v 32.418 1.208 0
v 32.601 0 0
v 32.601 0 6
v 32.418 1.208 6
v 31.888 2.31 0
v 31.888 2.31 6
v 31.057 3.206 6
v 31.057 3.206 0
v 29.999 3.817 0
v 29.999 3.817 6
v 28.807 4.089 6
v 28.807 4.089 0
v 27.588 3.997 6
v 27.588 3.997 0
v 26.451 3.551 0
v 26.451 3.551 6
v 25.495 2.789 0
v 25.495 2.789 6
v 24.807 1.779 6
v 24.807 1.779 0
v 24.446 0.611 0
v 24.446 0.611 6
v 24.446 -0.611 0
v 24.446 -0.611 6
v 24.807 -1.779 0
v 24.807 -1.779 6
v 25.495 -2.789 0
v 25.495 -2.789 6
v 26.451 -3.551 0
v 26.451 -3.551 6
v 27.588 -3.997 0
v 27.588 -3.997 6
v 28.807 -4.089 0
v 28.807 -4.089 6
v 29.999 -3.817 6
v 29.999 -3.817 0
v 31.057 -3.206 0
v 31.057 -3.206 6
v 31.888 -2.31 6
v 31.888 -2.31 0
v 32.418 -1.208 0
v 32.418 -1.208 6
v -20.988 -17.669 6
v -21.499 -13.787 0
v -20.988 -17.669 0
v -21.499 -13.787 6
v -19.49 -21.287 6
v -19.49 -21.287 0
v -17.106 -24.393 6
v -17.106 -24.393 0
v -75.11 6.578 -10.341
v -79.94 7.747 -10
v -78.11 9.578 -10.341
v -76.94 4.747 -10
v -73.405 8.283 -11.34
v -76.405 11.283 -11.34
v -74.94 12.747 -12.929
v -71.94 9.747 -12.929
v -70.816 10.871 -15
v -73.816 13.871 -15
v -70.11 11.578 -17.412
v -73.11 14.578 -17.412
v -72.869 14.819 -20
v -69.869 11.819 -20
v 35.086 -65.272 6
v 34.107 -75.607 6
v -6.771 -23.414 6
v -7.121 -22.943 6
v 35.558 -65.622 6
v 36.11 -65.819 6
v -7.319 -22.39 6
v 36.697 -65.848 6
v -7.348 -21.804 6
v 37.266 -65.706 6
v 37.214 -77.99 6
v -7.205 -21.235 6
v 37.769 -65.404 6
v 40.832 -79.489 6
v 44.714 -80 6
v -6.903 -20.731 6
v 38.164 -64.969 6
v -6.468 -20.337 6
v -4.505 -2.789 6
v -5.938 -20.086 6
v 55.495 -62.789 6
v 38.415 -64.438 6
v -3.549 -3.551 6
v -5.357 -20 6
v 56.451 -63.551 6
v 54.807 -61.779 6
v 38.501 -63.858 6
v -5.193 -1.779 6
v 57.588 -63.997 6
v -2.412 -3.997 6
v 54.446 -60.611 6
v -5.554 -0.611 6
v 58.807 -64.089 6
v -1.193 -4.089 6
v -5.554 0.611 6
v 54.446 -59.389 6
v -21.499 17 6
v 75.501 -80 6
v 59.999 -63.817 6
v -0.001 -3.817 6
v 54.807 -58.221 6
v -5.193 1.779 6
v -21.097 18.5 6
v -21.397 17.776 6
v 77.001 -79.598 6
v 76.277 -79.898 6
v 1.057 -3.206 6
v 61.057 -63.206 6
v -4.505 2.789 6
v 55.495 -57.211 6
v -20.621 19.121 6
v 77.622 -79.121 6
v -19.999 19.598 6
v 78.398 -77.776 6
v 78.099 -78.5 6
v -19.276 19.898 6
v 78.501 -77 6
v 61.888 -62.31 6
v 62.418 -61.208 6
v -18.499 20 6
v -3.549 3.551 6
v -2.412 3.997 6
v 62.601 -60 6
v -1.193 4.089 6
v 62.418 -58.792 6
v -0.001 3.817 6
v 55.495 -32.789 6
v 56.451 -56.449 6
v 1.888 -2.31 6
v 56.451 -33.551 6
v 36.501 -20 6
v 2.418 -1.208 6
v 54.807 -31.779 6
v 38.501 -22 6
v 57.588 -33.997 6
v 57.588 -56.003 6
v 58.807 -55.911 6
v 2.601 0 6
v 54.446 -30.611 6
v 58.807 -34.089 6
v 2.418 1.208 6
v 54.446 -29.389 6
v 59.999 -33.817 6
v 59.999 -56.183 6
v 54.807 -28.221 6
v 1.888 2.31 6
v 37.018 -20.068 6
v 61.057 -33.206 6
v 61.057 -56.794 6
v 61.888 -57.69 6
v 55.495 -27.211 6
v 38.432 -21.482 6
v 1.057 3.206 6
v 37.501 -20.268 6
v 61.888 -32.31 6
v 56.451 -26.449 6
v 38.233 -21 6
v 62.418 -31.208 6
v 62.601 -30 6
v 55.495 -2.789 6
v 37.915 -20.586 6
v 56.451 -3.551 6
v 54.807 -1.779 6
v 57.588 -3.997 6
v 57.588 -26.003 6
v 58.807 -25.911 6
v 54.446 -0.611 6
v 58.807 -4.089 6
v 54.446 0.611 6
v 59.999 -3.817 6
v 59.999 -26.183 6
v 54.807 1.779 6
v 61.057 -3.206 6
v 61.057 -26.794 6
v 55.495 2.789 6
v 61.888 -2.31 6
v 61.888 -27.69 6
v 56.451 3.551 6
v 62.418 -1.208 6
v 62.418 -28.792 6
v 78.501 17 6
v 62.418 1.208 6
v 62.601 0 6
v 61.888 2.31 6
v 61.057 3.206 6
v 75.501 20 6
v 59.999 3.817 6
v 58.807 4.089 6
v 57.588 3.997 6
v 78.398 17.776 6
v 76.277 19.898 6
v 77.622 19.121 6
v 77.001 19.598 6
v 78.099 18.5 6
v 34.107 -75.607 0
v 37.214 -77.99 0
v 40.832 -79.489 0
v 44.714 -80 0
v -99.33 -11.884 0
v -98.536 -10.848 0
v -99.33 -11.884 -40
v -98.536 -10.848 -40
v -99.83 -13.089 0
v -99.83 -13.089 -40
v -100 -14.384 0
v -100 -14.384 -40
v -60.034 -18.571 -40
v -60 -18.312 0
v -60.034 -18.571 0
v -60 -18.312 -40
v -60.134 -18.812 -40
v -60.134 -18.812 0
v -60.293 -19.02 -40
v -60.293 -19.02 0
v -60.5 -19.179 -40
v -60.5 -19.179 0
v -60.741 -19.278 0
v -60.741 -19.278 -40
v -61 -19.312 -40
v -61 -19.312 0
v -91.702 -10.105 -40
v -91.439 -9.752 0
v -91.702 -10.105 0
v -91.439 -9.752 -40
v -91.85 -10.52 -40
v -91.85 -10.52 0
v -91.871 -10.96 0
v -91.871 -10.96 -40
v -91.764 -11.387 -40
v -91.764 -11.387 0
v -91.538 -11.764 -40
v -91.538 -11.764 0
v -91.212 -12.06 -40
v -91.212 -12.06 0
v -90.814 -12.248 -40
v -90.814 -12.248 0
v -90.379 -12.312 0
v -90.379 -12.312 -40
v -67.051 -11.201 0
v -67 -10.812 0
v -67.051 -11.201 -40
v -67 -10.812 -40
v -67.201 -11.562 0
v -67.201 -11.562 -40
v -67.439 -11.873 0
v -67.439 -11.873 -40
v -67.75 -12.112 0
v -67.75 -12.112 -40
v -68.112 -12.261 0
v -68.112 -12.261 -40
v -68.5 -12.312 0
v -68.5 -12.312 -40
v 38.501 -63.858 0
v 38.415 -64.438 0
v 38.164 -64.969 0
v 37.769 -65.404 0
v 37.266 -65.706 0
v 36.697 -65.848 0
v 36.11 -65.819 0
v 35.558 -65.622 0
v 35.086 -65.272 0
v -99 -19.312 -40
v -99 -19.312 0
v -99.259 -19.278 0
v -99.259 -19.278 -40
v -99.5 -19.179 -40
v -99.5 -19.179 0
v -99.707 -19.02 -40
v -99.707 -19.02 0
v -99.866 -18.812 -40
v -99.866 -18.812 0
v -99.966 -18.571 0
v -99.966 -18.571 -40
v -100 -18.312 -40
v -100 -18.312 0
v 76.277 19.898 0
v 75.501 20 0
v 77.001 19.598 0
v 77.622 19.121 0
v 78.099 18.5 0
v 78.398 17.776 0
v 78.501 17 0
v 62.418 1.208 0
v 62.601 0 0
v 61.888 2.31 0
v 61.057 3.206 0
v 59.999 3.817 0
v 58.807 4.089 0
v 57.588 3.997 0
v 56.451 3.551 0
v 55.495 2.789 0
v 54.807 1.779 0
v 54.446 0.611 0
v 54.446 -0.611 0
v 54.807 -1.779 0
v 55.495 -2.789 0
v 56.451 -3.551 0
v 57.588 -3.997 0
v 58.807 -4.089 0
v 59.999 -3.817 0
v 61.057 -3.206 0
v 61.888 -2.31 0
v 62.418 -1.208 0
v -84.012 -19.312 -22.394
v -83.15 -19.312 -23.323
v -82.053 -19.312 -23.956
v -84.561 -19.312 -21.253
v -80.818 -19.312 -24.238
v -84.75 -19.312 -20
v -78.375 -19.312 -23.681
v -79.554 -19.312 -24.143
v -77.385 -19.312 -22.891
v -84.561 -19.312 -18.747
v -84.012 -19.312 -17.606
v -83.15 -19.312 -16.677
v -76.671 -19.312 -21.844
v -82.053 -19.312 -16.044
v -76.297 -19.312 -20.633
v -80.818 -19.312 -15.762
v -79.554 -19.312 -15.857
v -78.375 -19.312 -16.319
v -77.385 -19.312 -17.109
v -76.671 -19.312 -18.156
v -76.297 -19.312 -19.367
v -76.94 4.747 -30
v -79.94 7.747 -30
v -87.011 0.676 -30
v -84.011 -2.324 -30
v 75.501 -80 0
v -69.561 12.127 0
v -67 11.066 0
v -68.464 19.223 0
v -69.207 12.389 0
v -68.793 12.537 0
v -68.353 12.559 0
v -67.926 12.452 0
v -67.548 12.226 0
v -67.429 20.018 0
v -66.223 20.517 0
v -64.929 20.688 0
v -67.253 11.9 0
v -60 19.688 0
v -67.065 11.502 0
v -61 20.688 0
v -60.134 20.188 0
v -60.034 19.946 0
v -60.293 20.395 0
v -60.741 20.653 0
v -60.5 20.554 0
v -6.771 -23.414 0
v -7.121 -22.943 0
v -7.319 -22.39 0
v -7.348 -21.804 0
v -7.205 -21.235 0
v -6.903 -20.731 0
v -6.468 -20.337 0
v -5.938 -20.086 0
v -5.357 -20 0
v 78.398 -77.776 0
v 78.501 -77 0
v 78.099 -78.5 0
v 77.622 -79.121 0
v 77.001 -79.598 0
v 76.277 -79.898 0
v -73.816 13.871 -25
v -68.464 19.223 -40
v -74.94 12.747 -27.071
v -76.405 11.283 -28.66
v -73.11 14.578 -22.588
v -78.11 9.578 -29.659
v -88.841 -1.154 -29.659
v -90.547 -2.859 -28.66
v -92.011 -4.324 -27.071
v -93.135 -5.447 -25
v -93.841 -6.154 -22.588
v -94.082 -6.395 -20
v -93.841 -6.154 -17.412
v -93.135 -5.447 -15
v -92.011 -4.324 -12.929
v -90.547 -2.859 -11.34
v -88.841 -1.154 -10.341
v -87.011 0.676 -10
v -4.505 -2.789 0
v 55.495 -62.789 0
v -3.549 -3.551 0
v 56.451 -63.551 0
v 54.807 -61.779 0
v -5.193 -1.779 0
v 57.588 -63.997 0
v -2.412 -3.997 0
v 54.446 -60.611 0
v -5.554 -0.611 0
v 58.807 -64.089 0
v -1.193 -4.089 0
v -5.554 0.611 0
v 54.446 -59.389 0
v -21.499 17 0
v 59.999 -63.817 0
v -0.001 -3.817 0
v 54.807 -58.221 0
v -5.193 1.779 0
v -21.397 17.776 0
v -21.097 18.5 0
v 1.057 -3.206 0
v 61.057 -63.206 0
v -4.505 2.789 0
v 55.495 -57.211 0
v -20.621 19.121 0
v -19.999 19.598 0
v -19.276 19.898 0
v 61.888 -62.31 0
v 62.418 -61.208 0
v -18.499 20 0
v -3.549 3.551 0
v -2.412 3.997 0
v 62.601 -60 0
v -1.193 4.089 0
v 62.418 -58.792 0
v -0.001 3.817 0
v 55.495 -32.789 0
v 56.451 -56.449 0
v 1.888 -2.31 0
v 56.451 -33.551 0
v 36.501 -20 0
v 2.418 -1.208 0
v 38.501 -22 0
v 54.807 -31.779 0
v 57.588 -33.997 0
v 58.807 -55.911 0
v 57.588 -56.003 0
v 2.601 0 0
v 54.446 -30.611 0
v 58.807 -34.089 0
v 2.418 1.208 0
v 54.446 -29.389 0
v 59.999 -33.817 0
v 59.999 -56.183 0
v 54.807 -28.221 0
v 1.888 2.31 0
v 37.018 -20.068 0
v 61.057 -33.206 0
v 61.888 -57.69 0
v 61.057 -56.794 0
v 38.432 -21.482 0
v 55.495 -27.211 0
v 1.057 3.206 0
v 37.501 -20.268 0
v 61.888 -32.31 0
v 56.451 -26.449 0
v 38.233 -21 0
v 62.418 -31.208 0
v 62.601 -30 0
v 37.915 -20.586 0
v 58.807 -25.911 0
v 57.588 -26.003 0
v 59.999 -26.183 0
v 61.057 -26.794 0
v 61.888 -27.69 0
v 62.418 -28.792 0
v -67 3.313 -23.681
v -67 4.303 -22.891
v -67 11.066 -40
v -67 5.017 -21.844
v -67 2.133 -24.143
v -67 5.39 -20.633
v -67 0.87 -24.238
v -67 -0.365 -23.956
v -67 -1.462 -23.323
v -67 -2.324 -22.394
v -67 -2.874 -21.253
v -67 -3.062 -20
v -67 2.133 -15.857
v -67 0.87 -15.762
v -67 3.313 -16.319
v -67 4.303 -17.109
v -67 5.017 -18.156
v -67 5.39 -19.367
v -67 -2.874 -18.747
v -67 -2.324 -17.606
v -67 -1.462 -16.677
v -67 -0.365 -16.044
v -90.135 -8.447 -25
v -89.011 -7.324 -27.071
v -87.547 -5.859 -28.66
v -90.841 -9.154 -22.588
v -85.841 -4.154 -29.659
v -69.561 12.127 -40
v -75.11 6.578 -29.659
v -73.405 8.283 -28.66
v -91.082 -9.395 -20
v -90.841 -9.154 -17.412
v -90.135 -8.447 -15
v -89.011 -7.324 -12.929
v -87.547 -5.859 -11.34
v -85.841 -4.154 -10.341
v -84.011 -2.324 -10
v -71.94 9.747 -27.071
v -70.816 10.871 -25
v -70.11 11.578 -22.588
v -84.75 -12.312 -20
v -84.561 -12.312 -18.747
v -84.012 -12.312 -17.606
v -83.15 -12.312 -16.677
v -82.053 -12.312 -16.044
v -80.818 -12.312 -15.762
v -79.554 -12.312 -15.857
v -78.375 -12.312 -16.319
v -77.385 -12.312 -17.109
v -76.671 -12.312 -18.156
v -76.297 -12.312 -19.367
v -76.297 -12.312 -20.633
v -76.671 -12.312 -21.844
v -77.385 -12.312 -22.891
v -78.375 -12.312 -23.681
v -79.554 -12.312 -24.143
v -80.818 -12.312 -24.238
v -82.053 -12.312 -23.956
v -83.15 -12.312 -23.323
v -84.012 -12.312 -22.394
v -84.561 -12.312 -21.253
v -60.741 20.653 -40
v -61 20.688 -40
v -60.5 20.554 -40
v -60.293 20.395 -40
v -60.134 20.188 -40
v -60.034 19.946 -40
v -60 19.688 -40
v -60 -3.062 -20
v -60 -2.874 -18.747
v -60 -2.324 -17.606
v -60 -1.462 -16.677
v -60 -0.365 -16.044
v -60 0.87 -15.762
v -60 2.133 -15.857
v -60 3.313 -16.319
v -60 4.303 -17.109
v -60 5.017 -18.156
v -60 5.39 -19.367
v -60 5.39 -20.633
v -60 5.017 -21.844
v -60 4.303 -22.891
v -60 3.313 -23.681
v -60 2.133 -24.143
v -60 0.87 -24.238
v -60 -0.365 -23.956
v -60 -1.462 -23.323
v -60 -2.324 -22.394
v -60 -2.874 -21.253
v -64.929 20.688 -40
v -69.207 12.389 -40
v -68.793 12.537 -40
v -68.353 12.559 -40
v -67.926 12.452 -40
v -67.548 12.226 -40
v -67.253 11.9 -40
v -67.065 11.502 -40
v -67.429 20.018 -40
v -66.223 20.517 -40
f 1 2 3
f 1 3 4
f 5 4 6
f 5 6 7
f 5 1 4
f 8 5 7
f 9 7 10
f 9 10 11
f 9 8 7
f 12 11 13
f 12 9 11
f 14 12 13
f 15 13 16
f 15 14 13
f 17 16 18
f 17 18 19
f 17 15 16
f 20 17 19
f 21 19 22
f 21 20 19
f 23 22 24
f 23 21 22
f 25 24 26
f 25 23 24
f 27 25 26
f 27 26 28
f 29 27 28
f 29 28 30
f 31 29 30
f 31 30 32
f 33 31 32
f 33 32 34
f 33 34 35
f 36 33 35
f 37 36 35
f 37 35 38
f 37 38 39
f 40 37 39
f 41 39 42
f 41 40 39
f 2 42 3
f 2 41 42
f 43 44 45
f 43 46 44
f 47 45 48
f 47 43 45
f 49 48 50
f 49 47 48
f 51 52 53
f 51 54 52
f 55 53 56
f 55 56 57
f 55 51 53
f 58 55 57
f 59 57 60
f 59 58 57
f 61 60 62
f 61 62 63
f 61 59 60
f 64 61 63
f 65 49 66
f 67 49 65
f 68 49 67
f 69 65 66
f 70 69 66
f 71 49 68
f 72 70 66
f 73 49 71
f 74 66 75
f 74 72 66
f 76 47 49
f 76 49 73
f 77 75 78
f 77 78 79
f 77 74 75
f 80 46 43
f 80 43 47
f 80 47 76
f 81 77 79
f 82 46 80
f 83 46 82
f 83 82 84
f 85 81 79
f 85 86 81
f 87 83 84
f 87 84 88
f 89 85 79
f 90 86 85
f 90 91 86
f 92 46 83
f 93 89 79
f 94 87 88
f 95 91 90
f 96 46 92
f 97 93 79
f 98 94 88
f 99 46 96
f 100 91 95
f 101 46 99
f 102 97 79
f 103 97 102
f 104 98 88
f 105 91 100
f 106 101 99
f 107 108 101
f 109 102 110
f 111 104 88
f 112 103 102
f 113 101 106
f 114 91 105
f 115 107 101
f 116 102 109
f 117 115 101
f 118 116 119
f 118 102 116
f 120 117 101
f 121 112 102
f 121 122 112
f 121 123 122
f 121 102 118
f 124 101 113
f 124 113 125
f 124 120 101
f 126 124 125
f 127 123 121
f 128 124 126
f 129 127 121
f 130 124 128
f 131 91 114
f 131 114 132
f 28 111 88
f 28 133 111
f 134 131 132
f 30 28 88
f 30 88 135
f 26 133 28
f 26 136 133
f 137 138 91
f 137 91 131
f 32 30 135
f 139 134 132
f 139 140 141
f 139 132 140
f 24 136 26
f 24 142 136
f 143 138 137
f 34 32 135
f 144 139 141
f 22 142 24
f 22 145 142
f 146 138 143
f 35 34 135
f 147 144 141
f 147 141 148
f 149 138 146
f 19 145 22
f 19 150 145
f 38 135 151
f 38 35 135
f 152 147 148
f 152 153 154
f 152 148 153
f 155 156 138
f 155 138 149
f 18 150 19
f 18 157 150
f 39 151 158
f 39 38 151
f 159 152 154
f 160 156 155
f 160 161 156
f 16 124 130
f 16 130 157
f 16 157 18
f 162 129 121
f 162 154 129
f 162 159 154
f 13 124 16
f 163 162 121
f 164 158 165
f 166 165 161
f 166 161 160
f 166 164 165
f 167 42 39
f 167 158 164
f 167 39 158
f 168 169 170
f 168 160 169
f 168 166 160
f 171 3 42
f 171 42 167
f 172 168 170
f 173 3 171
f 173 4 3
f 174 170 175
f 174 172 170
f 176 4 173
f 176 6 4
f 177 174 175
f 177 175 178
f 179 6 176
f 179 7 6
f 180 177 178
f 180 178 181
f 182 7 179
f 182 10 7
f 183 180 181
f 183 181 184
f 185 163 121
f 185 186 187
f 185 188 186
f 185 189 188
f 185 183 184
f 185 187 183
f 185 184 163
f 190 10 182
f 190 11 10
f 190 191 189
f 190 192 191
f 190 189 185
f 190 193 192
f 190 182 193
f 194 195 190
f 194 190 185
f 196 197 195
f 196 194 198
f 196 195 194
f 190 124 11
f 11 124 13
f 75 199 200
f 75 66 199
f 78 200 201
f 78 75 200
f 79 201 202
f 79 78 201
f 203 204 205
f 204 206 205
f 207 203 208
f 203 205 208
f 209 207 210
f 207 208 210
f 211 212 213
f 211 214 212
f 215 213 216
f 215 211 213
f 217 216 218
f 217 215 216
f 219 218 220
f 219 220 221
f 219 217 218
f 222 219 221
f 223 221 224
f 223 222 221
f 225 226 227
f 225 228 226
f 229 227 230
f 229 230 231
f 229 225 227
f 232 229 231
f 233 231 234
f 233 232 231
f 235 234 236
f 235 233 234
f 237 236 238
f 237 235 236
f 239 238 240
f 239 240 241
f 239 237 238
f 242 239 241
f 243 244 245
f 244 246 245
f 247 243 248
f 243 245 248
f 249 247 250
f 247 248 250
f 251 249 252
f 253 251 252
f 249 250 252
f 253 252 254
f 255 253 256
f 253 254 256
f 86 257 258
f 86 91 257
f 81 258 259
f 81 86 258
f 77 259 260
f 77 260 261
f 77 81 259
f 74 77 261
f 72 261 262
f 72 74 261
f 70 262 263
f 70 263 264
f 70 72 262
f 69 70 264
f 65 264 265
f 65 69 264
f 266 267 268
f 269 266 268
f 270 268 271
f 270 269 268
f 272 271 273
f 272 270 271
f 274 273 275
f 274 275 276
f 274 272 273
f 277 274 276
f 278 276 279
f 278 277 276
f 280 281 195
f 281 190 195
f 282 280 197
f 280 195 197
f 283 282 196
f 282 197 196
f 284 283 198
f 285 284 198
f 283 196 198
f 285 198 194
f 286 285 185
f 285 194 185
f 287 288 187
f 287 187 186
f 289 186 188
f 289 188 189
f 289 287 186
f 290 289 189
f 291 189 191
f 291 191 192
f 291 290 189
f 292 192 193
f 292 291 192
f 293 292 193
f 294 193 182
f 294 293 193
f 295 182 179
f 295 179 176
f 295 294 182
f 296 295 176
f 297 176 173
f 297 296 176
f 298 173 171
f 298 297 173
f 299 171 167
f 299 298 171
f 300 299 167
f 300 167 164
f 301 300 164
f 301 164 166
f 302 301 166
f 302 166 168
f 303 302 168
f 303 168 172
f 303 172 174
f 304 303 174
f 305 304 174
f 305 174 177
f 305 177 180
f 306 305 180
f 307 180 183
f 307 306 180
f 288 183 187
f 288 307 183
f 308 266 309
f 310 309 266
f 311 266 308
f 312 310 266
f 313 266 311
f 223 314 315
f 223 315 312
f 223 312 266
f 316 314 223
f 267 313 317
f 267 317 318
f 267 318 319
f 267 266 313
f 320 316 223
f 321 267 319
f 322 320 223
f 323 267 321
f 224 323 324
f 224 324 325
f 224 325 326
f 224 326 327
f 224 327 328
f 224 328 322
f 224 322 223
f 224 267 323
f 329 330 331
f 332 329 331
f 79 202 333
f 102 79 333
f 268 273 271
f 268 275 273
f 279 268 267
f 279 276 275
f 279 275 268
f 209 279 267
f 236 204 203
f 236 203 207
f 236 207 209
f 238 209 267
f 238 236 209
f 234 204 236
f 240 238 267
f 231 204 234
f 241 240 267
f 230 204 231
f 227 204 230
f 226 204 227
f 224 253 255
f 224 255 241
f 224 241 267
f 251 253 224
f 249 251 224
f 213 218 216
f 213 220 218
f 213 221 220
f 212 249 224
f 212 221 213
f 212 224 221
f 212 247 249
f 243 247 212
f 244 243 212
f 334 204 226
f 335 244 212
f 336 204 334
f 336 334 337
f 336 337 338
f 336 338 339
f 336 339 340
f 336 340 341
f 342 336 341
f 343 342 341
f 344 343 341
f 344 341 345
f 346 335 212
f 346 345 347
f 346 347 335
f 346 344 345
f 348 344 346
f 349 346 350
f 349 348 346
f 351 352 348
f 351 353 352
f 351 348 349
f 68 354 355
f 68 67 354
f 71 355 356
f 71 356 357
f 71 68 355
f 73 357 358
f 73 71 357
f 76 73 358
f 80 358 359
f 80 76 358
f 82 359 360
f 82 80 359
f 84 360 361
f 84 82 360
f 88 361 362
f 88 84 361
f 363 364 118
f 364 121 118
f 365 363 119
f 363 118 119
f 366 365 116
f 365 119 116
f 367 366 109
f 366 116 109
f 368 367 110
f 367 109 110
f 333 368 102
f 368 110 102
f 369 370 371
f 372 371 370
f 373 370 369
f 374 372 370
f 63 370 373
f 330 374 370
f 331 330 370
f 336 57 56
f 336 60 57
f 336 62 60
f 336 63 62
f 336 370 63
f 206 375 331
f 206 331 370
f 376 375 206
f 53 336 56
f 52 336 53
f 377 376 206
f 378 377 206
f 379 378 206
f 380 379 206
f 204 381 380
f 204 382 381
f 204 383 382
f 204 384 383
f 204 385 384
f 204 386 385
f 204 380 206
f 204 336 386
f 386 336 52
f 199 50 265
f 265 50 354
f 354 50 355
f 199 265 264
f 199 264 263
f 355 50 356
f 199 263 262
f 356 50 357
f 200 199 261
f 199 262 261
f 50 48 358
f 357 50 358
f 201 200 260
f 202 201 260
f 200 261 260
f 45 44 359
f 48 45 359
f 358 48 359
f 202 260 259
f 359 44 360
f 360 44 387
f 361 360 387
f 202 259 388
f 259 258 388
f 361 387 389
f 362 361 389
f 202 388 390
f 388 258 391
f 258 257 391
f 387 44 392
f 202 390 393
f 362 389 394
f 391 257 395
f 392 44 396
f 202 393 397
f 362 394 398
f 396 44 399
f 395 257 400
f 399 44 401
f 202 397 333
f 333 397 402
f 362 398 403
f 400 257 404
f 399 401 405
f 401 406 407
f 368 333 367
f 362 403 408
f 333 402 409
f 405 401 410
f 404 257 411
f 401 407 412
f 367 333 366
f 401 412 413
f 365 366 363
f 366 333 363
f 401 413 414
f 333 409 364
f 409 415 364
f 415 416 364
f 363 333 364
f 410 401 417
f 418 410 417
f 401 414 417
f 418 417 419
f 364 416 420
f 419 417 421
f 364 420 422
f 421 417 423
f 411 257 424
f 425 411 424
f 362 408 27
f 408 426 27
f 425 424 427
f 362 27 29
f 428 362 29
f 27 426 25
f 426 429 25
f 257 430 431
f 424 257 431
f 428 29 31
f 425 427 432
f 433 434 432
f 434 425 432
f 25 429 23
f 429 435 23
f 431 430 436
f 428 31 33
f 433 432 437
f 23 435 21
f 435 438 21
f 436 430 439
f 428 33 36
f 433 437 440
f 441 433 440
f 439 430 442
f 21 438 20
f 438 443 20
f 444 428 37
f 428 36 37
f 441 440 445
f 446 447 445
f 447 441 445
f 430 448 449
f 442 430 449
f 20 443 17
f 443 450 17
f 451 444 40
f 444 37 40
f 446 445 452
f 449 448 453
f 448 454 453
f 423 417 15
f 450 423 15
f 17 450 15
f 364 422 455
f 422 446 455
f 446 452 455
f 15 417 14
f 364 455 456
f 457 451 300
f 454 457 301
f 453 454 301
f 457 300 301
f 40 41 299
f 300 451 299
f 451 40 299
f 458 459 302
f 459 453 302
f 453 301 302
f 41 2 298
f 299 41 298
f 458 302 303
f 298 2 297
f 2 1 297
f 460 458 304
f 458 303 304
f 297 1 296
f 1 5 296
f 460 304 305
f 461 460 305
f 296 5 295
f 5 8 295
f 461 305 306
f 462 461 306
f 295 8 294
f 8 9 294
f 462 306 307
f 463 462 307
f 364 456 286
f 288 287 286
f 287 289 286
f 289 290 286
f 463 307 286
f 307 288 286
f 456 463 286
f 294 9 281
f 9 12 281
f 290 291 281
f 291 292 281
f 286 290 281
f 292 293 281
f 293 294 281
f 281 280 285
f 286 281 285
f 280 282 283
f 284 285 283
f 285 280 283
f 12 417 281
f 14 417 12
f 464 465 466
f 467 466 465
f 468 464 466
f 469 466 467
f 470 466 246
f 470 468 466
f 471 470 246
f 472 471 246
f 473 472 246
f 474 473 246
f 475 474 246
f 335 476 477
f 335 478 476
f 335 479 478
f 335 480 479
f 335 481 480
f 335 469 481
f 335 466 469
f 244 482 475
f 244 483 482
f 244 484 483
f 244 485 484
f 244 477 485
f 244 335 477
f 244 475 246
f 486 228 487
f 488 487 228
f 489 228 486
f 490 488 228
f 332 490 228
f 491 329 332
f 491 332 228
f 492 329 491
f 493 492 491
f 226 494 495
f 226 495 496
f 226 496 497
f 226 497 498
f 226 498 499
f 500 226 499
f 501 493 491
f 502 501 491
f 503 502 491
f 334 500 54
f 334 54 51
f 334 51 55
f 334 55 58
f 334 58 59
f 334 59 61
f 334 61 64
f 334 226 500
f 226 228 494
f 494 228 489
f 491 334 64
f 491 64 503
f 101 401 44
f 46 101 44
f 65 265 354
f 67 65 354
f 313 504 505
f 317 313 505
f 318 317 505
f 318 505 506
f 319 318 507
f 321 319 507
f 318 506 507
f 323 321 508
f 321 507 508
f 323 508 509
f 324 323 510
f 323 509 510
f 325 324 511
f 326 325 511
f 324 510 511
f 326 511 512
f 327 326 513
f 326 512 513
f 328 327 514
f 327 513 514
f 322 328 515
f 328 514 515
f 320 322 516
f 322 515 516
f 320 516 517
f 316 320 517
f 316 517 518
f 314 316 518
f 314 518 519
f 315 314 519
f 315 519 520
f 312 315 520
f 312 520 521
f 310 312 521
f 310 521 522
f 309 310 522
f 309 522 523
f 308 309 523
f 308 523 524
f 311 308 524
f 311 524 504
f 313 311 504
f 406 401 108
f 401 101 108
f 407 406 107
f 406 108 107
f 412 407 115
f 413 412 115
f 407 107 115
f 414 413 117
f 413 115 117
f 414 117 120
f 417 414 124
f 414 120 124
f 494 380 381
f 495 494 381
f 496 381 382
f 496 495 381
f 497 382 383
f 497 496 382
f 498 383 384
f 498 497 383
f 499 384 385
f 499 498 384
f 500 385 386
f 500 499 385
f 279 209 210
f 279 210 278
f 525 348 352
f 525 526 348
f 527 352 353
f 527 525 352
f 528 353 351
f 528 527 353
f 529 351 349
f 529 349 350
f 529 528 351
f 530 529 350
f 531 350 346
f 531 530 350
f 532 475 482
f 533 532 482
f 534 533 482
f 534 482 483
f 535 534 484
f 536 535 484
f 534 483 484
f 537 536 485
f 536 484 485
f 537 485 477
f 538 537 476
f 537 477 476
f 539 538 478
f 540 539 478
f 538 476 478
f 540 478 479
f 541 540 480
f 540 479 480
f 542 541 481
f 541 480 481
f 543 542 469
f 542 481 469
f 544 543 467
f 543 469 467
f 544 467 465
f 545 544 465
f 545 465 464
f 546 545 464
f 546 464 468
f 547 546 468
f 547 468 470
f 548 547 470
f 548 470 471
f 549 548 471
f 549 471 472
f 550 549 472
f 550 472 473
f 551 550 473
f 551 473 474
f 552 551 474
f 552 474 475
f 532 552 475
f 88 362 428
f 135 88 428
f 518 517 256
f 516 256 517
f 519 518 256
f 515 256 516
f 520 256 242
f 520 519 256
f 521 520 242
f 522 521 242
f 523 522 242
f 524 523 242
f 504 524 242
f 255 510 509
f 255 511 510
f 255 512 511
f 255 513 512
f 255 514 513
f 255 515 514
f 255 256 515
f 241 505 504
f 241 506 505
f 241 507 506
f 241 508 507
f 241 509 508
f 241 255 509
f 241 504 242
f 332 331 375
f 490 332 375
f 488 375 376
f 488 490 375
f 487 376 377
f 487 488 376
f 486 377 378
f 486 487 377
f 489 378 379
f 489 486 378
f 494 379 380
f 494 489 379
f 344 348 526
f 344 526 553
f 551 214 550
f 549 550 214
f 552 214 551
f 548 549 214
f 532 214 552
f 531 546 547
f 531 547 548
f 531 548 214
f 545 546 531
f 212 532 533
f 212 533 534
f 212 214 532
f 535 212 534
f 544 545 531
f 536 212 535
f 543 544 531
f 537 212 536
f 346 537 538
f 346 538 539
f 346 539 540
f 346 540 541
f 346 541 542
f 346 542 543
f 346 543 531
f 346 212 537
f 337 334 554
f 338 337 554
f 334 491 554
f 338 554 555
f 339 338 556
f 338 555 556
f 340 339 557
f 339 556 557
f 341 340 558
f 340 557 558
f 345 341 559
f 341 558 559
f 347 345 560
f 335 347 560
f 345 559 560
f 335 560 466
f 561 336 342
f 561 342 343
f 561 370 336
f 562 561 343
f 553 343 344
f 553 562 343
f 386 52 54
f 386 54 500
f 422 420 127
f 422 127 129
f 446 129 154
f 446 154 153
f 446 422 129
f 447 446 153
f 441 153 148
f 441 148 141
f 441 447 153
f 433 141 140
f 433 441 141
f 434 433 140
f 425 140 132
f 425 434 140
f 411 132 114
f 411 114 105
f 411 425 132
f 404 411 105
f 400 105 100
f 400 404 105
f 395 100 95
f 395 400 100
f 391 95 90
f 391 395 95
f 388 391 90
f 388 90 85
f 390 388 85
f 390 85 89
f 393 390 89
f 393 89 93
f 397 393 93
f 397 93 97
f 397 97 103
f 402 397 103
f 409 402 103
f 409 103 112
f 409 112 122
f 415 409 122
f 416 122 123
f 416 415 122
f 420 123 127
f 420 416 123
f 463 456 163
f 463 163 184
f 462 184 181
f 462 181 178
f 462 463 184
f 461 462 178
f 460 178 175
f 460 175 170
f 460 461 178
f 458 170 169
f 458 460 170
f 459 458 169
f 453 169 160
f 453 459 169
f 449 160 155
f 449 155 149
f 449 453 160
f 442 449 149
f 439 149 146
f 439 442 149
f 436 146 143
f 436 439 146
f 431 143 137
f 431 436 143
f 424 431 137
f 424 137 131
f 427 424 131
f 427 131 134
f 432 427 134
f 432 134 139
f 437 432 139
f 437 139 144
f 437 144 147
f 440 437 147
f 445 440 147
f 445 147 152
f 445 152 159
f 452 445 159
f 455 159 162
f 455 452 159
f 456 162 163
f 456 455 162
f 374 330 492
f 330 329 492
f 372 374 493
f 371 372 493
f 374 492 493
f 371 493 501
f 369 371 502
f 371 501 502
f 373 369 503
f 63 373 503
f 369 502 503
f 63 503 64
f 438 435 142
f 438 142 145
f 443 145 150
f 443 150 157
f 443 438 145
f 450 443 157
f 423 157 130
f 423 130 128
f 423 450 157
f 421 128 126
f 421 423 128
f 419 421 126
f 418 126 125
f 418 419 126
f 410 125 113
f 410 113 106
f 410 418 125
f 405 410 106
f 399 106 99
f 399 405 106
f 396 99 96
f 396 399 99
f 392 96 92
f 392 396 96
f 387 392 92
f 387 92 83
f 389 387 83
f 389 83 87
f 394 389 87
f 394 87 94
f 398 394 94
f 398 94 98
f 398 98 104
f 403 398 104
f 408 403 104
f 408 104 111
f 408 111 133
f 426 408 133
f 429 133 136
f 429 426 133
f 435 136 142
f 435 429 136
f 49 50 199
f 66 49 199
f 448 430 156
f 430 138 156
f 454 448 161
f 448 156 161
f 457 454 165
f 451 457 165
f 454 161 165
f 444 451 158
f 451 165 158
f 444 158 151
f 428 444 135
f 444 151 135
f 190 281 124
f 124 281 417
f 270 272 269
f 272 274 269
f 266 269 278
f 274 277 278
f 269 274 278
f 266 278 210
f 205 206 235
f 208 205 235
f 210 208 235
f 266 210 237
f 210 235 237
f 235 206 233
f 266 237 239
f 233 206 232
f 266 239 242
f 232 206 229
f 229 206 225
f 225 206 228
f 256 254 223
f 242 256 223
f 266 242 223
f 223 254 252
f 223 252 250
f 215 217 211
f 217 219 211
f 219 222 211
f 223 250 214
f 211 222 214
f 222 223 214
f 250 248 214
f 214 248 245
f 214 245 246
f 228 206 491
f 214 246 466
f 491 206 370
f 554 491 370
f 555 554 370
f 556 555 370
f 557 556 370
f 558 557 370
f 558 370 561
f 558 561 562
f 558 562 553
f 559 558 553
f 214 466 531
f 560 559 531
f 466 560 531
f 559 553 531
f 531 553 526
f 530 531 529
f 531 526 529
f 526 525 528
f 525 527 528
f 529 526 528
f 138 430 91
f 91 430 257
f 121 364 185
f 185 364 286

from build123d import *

# Parameters (mm, degrees)
F0_R           = 4.1
F1_DEPTH       = 6
F2_DEPTH       = 40
F5_D           = 8.5
F5_DEPTH       = 28
F5_TIP         = 2.5536576309
F5_ON_F3_D     = 8.5
F5_ON_F3_DEPTH = 28
F5_ON_F3_TIP   = 2.5536576309
F6_W           = 30
F6_H           = 20
F7_DEPTH       = 5
F8_R           = 9.99999
F9_R           = 5
F10_R          = 1.5
F11_R          = 1
F12_R          = 15
F13_R          = 2
F14_R          = 3


# Not quite as in the source:
# - a fillet or chamfer is up to 0.001 mm smaller than in the source, because OpenCascade refuses the exact size


with BuildPart() as f1:
    # F0 (on Top) → F1 (new body)
    with BuildSketch(Plane.XY):
        Polygon((78.5006253216, -80), (78.5006253216, 20), (-21.4993746784, 20), (-21.4993746784, -20), (-10.1856661794, -20), (38.5006253216, -20), (38.5006253216, -68.686291501), (38.5006253216, -80), align=None)
        with Locations((58.5006253216, -60)):
            Circle(F0_R, mode=Mode.SUBTRACT)
        with Locations((58.5006253216, -30)):
            Circle(F0_R, mode=Mode.SUBTRACT)
        with Locations((-1.4993746784, 0)):
            Circle(F0_R, mode=Mode.SUBTRACT)
        with Locations((28.5006253216, 0)):
            Circle(F0_R, mode=Mode.SUBTRACT)
        with Locations((58.5006253216, 0)):
            Circle(F0_R, mode=Mode.SUBTRACT)
        Polygon((-10.1856661794, -20), (-21.4993746784, -20), (38.5006253216, -80), (38.5006253216, -68.686291501), align=None)
    extrude(amount=F1_DEPTH)

    # F12
    f12_edges = [f1.edges().sort_by_distance(p)[0] for p in [
        (38.500625, -80, 3),
        (-21.499375, -20, 3),
    ]]
    fillet(f12_edges, radius=F12_R)

    # F13
    f13_edges = [f1.edges().sort_by_distance(p)[0] for p in [
        (38.500625, -20, 3),
        (-10.185666, -20, 3),
        (38.500625, -68.686292, 3),
    ]]
    fillet(f13_edges, radius=F13_R)

    # F14
    f14_edges = [f1.edges().sort_by_distance(p)[0] for p in [
        (-21.499375, 20, 3),
        (78.500625, 20, 3),
        (78.500625, -80, 3),
    ]]
    fillet(f14_edges, radius=F14_R)


with BuildPart() as f2:
    # F0 (on Top) → F2 (new body)
    with BuildSketch(Plane.XY):
        Polygon((-100, -19.3125), (-60, -19.3125), (-60, 20.6875), (-61, 20.6875), (-67, 14.6875), (-67, -12.3125), (-94, -12.3125), (-100, -18.3125), align=None)
        Polygon((-100, -12.3125), (-100, -18.3125), (-94, -12.3125), align=None)
        Polygon((-67, 20.6875), (-100, -12.3125), (-94, -12.3125), (-67, 14.6875), align=None)
        Polygon((-67, 14.6875), (-61, 20.6875), (-67, 20.6875), align=None)
    extrude(amount=-F2_DEPTH)

    # F5 (one way)
    with BuildSketch(Plane(origin=(-67, 0, 0), x_dir=(0, -1, 0), z_dir=(-1, 0, 0))):
        with Locations((-1.1875, -20)):
            Circle(F5_D / 2)
    extrude(amount=-F5_DEPTH, mode=Mode.SUBTRACT)
    with Locations(Plane(origin=(-67, 0, 0), x_dir=(0, -1, 0), z_dir=(-1, 0, 0))):
        with Locations((-1.1875, -20)):
            with Locations((0, 0, -(F5_DEPTH + F5_TIP / 2))):  # 118° drill point
                Cone(0, F5_D / 2, F5_TIP, mode=Mode.SUBTRACT)

    # F5 on F3 (one way)
    with BuildSketch(Plane(origin=(0, -12.3125, 0), x_dir=(-1, 0, 0), z_dir=(0, 1, 0))):
        with Locations((80.5, -20)):
            Circle(F5_ON_F3_D / 2)
    extrude(amount=-F5_ON_F3_DEPTH, mode=Mode.SUBTRACT)
    with Locations(Plane(origin=(0, -12.3125, 0), x_dir=(-1, 0, 0), z_dir=(0, 1, 0))):
        with Locations((80.5, -20)):
            with Locations((0, 0, -(F5_ON_F3_DEPTH + F5_ON_F3_TIP / 2))):  # 118° drill point
                Cone(0, F5_ON_F3_D / 2, F5_ON_F3_TIP, mode=Mode.SUBTRACT)

    # F6 (on face) → F7 (cut)
    with BuildSketch(Plane(origin=(-43.84375, 43.84375, 0), x_dir=(-0.7071067812, -0.7071067812, 0), z_dir=(-0.7071067812, 0.7071067812, 0))):
        with Locations((56.0478828037, -20)):
            Rectangle(F6_W, F6_H)
    extrude(amount=-F7_DEPTH, mode=Mode.SUBTRACT)

    # F8 (radius 10 in the source; OpenCascade refuses exactly that, so slightly less here)
    f8_edges = [f2.edges().sort_by_distance(p)[0] for p in [
        (-92.58219, -7.89469, -10),
        (-92.58219, -7.89469, -30),
        (-71.368986, 13.318514, -30),
        (-71.368986, 13.318514, -10),
    ]]
    fillet(f8_edges, radius=F8_R)

    # F9
    f9_edges = [f2.edges().sort_by_distance(p)[0] for p in [
        (-67, 20.6875, -20),
        (-100, -12.3125, -20),
    ]]
    fillet(f9_edges, radius=F9_R)

    # F10
    f10_edges = [f2.edges().sort_by_distance(p)[0] for p in [
        (-67, 14.6875, -20),
        (-67, -12.3125, -20),
        (-94, -12.3125, -20),
    ]]
    fillet(f10_edges, radius=F10_R)

    # F11
    f11_edges = [f2.edges().sort_by_distance(p)[0] for p in [
        (-60, 20.6875, -20),
        (-100, -19.3125, -20),
        (-60, -19.3125, -20),
    ]]
    fillet(f11_edges, radius=F11_R)


solid = Compound([f1.part, f2.part])
